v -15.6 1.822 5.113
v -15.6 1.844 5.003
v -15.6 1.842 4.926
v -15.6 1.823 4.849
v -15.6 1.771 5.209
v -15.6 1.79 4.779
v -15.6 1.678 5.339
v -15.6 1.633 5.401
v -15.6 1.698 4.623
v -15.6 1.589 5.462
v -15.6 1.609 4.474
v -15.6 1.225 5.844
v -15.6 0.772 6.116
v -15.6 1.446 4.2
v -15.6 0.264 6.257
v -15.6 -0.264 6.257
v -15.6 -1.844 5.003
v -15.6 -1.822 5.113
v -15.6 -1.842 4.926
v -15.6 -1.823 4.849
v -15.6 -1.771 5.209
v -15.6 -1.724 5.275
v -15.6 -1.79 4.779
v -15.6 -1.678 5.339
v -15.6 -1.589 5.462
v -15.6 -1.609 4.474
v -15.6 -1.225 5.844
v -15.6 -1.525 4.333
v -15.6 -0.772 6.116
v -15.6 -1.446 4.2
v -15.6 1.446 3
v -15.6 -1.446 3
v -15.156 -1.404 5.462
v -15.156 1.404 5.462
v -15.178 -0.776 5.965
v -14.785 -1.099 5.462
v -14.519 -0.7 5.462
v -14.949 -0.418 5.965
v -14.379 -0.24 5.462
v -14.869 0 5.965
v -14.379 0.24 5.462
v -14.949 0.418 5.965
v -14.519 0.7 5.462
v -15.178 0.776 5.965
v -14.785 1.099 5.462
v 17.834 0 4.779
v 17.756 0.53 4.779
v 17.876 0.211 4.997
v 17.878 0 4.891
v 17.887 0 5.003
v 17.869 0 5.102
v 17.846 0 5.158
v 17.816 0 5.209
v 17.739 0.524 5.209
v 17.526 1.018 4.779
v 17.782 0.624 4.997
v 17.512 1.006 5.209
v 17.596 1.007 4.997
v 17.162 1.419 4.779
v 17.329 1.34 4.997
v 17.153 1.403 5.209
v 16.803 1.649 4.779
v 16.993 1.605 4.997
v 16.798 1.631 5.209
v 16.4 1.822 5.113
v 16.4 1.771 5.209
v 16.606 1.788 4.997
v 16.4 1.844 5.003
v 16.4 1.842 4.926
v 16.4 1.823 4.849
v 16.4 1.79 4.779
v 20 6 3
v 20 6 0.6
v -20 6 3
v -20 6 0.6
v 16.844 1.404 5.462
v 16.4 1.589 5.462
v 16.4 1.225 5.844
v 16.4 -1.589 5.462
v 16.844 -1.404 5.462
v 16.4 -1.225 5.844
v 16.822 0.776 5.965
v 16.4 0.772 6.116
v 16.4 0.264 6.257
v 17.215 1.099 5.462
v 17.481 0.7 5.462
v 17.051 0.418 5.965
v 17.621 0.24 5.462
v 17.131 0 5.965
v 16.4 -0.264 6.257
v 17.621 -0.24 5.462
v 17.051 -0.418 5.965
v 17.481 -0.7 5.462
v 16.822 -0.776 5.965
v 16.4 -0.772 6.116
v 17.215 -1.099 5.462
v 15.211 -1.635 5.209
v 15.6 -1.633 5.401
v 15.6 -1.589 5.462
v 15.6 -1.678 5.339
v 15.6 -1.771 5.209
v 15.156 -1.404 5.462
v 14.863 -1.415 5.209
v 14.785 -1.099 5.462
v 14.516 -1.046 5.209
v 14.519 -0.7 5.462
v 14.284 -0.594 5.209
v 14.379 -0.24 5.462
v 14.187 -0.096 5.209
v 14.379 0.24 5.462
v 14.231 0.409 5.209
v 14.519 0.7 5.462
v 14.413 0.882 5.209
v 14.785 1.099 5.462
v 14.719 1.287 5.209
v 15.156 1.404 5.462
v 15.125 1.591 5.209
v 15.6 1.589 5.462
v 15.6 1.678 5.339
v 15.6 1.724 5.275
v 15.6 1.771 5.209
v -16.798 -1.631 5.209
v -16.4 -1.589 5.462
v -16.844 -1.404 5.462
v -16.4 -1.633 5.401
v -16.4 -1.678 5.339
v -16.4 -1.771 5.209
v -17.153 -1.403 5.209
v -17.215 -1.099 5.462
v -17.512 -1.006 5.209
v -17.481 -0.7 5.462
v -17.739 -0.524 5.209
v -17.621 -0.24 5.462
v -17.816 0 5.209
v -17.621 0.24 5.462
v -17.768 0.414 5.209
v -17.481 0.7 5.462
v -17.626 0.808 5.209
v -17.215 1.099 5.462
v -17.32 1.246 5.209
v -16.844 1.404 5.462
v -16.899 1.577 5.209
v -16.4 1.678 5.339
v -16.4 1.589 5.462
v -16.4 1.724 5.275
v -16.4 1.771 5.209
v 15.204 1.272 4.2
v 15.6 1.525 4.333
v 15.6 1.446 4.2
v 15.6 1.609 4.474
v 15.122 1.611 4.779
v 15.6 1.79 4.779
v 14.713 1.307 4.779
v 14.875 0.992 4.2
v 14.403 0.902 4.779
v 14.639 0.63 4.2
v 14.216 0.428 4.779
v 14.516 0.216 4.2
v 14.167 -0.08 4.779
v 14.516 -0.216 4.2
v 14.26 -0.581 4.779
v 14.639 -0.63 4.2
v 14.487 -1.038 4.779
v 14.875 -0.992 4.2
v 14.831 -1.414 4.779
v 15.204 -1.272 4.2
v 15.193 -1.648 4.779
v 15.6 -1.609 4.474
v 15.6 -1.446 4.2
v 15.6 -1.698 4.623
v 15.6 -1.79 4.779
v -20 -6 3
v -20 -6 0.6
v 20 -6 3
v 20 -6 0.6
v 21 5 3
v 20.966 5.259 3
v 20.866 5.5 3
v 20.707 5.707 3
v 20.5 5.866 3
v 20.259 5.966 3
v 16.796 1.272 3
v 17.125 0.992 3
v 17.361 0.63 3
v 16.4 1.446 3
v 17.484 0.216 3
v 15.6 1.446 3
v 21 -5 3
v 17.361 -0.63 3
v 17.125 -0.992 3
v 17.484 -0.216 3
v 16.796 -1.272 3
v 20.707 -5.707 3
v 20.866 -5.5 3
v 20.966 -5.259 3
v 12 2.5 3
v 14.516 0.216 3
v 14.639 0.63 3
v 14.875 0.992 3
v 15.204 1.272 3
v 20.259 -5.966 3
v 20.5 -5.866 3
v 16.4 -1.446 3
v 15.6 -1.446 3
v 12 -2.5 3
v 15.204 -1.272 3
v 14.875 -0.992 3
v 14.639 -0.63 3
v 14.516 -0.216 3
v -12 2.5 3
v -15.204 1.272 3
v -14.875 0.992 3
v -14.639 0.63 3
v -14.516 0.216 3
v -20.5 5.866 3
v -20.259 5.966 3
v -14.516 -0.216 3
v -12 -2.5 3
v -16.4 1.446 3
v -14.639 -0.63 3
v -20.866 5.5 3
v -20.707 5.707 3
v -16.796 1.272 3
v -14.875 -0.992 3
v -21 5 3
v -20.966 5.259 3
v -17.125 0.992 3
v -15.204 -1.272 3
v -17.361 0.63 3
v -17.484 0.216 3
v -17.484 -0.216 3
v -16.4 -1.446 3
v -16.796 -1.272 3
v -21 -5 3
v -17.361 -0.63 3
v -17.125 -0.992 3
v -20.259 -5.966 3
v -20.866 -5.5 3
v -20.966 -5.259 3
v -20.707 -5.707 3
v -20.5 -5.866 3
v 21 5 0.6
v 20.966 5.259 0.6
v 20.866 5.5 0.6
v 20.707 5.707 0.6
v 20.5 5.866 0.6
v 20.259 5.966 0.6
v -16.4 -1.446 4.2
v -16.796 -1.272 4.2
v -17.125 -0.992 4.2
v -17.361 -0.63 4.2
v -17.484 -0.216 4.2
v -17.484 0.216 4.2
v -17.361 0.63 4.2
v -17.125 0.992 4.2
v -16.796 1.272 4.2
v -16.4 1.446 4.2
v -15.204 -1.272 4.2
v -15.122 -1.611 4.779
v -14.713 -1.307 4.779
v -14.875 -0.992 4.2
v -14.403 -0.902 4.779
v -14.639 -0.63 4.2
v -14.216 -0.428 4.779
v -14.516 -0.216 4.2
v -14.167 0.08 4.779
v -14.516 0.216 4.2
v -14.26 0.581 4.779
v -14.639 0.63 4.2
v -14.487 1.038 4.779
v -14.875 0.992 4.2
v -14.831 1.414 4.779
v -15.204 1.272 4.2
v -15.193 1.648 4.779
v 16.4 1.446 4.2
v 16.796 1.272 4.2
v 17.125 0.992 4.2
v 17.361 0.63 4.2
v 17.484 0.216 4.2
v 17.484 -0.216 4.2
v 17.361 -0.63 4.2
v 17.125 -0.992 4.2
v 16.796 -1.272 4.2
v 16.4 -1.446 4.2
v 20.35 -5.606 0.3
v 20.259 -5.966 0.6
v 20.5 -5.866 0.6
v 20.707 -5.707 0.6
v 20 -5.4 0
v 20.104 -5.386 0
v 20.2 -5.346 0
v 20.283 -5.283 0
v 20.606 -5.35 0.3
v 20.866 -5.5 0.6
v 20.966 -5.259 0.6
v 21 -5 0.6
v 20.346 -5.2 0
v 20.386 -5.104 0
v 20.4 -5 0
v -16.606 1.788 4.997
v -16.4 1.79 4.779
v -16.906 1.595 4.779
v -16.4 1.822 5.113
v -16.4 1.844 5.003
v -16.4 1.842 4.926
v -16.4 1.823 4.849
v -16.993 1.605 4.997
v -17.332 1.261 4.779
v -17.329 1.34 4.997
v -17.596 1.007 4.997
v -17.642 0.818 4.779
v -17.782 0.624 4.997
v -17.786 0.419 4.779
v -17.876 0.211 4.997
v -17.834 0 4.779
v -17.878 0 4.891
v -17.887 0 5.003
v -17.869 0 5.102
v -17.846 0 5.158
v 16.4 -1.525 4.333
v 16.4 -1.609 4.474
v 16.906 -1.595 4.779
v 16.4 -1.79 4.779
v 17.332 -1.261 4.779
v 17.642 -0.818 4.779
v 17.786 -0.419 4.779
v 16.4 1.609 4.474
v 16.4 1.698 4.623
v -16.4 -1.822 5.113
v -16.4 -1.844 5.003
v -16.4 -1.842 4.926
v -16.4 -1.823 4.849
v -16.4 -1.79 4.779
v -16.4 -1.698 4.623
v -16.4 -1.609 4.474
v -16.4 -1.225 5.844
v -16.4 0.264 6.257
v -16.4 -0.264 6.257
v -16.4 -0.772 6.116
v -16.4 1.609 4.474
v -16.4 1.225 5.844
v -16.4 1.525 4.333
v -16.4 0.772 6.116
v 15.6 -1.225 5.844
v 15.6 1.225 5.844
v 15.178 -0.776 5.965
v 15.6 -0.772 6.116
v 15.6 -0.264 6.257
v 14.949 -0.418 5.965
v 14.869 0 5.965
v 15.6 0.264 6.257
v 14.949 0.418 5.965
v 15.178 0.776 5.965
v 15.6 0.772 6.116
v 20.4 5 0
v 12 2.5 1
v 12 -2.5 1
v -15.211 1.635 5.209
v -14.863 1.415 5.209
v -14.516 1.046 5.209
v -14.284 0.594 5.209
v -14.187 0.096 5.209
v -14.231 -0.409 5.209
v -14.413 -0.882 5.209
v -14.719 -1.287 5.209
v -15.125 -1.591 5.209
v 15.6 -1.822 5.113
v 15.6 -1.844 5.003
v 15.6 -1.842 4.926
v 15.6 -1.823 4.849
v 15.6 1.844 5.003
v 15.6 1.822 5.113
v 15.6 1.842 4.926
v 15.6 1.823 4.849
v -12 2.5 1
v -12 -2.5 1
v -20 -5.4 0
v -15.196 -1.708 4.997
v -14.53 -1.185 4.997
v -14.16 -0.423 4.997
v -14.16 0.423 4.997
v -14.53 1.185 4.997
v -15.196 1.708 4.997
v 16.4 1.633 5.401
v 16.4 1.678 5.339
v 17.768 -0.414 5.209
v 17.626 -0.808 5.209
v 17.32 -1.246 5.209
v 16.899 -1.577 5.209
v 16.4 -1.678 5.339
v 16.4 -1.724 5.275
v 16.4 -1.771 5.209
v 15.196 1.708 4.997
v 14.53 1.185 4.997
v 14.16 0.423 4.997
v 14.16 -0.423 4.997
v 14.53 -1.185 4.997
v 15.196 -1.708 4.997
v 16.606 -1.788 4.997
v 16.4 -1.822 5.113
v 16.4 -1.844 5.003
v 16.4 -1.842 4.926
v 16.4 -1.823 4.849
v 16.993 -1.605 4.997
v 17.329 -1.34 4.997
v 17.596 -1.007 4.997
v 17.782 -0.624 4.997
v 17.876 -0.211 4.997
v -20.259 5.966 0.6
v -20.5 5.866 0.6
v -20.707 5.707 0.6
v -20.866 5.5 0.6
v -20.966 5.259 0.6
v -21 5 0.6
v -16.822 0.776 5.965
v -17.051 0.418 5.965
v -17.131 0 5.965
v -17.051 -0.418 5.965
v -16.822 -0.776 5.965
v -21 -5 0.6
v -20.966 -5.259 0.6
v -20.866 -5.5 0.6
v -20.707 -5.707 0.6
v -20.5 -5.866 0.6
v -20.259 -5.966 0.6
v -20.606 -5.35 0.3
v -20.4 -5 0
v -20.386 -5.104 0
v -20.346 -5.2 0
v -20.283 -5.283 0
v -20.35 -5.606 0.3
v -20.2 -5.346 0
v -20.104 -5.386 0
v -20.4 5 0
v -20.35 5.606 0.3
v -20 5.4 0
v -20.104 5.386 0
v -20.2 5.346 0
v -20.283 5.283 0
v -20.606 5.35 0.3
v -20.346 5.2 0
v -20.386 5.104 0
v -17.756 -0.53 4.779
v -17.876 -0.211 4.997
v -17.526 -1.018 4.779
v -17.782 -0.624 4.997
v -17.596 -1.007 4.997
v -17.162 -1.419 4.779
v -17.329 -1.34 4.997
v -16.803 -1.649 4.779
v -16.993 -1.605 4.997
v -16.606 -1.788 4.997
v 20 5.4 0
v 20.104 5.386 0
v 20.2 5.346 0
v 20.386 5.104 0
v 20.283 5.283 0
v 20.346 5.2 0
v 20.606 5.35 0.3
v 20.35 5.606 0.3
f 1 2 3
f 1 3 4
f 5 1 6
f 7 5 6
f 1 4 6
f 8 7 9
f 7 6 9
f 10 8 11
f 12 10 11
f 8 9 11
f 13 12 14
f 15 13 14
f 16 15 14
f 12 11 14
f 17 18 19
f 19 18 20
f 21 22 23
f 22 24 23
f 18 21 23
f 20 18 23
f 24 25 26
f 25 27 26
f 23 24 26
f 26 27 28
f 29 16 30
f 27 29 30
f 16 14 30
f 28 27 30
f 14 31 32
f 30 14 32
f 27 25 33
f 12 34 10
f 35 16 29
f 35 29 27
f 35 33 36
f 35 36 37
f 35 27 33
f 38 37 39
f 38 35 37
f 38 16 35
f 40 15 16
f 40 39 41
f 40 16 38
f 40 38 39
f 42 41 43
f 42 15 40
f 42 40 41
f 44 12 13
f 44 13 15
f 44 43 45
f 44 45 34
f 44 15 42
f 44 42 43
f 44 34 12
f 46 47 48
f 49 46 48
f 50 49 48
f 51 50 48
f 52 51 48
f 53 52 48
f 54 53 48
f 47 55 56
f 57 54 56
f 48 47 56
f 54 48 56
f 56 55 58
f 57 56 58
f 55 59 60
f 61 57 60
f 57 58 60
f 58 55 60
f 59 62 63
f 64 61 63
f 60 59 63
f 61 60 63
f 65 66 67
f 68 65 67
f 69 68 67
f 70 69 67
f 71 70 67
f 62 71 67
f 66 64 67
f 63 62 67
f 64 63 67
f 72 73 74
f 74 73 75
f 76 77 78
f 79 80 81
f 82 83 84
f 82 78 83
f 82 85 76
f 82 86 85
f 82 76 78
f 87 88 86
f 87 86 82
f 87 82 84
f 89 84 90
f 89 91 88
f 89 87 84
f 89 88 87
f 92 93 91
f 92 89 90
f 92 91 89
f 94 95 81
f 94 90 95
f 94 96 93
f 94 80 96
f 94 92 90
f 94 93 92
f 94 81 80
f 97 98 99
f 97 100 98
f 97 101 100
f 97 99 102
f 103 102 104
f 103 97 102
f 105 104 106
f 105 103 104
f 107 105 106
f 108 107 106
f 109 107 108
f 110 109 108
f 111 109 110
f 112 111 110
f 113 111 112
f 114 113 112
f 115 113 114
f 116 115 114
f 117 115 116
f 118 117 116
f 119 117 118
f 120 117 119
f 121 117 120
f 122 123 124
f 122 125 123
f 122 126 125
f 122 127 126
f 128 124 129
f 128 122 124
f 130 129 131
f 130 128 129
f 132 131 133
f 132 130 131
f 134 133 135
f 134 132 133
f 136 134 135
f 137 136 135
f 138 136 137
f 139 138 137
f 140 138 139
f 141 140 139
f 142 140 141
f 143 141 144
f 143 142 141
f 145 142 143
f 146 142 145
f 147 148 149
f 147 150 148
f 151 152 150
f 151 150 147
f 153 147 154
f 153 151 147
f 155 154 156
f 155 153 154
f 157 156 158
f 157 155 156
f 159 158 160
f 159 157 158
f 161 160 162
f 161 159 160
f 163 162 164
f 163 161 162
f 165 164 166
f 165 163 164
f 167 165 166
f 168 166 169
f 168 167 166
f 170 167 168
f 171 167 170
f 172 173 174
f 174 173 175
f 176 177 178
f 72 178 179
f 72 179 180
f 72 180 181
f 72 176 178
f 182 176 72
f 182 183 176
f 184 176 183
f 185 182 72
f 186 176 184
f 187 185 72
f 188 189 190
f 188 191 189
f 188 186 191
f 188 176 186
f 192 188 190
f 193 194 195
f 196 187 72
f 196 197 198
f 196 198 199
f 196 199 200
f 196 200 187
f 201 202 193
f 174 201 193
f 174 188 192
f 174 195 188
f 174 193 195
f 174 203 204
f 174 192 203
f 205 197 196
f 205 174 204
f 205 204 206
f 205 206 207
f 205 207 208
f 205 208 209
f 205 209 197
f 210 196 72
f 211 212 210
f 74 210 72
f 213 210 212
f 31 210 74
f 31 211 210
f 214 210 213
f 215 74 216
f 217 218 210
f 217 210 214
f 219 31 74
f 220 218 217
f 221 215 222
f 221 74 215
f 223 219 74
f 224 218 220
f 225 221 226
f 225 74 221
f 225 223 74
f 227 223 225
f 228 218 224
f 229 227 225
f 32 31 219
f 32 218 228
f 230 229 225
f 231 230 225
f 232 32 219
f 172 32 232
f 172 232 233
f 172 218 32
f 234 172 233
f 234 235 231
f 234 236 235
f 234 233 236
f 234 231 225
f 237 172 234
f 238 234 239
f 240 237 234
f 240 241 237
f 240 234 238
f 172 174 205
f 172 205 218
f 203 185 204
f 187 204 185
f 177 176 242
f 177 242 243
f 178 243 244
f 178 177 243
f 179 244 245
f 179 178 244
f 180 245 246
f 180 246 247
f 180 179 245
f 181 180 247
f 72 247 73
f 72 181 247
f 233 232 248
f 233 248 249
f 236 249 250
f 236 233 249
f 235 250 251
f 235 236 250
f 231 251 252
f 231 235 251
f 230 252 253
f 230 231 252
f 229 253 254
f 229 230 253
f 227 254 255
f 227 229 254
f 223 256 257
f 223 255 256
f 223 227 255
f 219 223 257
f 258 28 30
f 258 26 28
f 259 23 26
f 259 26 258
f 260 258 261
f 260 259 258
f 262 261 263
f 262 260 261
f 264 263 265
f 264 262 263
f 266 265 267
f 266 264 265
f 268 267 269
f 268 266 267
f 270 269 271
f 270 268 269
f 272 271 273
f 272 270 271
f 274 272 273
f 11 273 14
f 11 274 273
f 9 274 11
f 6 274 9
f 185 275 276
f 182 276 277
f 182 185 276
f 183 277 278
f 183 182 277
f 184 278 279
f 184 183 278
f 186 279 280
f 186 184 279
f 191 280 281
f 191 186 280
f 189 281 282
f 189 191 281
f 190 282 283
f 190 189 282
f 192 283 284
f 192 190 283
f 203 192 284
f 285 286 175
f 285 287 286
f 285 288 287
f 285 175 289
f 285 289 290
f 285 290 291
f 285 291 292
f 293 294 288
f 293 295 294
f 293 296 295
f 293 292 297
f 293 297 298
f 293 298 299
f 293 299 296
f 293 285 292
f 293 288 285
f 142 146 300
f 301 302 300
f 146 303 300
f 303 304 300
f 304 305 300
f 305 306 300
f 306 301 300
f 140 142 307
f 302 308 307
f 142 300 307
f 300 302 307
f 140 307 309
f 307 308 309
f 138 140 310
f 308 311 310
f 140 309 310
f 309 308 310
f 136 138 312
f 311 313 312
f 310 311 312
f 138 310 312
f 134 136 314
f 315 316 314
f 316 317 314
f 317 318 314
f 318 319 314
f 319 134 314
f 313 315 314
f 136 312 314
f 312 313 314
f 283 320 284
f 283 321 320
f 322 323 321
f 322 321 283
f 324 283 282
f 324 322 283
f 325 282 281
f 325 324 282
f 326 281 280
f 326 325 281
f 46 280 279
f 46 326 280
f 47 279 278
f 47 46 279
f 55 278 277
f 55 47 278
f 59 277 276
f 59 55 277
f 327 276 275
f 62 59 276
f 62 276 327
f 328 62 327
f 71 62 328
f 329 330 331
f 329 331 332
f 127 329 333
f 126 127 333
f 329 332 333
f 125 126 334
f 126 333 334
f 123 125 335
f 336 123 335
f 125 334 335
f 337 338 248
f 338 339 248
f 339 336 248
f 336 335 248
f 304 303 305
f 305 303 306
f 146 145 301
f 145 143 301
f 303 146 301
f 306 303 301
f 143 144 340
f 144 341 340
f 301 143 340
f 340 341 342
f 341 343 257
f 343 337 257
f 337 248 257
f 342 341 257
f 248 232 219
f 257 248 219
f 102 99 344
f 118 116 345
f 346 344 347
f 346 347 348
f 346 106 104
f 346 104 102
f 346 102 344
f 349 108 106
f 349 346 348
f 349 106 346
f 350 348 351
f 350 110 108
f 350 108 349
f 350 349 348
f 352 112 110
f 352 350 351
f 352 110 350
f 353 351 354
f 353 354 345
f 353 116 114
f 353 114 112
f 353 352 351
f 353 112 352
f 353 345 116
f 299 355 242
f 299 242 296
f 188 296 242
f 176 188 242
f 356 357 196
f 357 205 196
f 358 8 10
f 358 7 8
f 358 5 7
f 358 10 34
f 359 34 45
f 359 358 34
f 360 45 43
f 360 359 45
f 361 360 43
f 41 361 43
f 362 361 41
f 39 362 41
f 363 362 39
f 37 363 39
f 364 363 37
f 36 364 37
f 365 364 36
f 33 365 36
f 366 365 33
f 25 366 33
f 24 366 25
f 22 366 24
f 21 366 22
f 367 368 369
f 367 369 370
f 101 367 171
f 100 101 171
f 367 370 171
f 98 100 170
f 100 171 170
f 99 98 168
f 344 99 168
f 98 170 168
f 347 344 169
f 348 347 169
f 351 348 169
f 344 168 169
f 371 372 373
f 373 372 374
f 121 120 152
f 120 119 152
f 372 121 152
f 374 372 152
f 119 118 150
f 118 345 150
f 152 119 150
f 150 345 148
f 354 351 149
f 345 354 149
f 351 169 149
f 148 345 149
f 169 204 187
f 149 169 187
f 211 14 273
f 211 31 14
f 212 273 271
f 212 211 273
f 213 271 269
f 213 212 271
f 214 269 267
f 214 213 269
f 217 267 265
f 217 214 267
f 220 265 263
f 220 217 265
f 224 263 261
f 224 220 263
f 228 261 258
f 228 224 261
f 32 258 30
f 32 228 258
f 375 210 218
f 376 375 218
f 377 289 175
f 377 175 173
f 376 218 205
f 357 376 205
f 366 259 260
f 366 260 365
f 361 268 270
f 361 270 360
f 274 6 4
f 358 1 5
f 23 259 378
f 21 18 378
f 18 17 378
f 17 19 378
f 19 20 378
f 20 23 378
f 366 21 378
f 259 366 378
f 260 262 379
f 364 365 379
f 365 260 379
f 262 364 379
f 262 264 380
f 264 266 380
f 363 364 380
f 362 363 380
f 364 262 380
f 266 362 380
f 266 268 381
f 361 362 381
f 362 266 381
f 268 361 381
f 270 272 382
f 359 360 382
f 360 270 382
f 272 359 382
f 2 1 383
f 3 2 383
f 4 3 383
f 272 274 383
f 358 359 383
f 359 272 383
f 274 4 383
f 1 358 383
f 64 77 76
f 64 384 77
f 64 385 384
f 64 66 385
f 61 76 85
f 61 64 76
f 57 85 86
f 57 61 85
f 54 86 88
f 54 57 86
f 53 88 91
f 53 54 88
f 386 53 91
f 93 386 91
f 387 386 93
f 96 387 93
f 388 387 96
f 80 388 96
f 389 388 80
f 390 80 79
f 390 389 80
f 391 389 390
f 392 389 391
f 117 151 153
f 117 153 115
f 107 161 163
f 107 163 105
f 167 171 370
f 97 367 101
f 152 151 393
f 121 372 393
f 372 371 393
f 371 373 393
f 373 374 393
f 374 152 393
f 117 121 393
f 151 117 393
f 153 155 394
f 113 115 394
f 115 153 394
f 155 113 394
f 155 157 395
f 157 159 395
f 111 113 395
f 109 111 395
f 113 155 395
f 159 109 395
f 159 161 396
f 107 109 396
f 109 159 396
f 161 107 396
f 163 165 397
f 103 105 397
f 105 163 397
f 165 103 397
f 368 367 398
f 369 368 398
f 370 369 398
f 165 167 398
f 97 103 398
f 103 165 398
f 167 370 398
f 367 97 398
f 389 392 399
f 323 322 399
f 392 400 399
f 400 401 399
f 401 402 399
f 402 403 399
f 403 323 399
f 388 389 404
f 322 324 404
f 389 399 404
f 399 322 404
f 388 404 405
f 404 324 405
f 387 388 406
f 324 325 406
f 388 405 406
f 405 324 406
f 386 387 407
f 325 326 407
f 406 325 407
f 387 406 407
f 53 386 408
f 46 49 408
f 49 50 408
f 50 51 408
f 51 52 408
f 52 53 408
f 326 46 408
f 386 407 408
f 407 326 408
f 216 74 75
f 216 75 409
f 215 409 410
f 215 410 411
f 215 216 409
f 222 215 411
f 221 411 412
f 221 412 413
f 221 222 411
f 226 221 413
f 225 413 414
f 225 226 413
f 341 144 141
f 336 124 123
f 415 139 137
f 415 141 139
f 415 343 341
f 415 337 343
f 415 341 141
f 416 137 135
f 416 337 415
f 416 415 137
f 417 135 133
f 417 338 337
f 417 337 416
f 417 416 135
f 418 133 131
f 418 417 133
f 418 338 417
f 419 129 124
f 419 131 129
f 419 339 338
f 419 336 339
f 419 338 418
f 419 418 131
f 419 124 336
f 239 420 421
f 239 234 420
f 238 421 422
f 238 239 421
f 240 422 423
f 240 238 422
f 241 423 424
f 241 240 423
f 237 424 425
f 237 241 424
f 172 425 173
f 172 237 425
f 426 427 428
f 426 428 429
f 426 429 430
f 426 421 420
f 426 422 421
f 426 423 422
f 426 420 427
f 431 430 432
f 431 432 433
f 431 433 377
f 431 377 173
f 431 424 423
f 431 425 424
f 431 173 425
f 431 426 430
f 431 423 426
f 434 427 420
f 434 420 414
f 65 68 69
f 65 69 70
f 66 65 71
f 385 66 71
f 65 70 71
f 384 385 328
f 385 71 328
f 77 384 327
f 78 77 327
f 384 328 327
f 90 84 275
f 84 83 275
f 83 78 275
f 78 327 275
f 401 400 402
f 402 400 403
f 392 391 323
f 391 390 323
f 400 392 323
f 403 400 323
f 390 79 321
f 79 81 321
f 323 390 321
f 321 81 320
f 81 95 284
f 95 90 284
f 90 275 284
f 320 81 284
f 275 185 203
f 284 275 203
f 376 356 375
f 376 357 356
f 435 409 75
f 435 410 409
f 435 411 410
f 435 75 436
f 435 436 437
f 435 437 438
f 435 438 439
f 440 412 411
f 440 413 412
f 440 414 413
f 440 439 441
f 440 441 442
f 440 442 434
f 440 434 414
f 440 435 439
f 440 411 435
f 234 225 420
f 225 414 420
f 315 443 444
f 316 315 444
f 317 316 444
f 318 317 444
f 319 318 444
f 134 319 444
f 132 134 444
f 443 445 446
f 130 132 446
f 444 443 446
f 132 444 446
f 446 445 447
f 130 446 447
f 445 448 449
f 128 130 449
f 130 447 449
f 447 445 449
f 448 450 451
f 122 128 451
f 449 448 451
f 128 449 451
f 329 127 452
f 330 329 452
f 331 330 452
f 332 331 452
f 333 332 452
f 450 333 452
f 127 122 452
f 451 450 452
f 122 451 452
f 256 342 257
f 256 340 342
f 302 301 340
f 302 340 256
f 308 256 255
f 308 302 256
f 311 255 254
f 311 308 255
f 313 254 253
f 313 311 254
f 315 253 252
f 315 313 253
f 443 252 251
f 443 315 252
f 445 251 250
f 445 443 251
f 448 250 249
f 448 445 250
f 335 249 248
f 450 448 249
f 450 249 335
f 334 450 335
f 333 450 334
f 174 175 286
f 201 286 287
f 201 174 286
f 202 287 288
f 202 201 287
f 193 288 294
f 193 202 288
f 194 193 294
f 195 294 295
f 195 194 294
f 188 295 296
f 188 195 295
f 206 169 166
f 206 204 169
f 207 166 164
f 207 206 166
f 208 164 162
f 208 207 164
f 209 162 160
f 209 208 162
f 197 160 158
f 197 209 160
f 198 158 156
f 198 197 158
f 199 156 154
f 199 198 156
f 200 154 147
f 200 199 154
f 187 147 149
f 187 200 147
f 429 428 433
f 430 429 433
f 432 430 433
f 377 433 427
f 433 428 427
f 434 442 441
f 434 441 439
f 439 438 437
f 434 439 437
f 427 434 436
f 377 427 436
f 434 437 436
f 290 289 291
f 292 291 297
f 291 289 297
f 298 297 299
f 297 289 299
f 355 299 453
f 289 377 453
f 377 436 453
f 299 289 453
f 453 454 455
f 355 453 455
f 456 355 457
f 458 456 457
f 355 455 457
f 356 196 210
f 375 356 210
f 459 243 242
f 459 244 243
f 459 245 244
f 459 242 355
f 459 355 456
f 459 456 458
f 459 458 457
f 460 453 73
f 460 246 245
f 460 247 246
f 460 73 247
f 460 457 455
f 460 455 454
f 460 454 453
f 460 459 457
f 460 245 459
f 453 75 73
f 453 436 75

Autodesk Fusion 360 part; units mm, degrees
sketch "Sketch1" plane through (0, 0, 0) normal (0, 0, 1) x (1, 0, 0)
  line L0 (21, 6) -> (-21, 6)
  line L1 (-21, 6) -> (-21, -6)
  line L2 (-21, -6) -> (21, -6)
  line L3 (21, -6) -> (21, 6)
  line L4 (21, 6) -> (-21, -6) construction
  line L5 (-21, 6) -> (21, -6) construction
  line L6 (-16, 0) -> (16, 0) construction
  circle A0 centre (-16, 0) radius 2.35
  circle A1 centre (16, 0) radius 2.35
  dimension "d1" = 12
  dimension "d2" = 42
  dimension "d3" = 32
  dimension "d4" = 4.7
extrude "Extrude1" add sketch "Sketch1" along normal blind 3 contours L0 L1 L2 L3 | A0 | A1
sketch "Sketch2" plane through (0, 0, 3) normal (0, 0, 1) x (-1, 0, 0)
  line L0 (-21, 6) -> (-21, -6)
  line L1 (-21, -6) -> (21, -6)
  line L2 (21, -6) -> (21, 6)
  line L3 (21, 6) -> (-21, 6)
  line L4 (16, 0) -> (-16, 0) construction
  circle A0 centre (16, 0) radius 1.5
  circle A1 centre (-16, 0) radius 1.5
  dimension "d7" = 32
  dimension "d11" = 3
extrude "Extrude2" add sketch "Sketch2" along normal blind 2 contours A0 | A1
sketch "Sketch3" plane through (0, 0, 3) normal (0, 0, 1) x (-1, 0, 0)
  line L0 (12, 2.5) -> (-12, 2.5)
  line L1 (-12, 2.5) -> (-12, -2.5)
  line L2 (-12, -2.5) -> (12, -2.5)
  line L3 (12, -2.5) -> (12, 2.5)
  line L4 (12, 2.5) -> (-12, -2.5) construction
  line L5 (-12, 2.5) -> (12, -2.5) construction
  dimension "d14" = 24
  dimension "d15" = 5
extrude "Extrude3" cut sketch "Sketch3" against normal blind 2
sketch "Sketch4" plane through (0, 0, 0) normal (0, 1, 0) x (1, 0, 0)
  line L0 (14.5, -5) -> (17.5, -5)
  line L1 (17.5, -3) -> (14.5, -3)
  line L2 (17.5, -3) -> (17.5, -5)
  line L3 (14.5, -3) -> (14.5, -5)
  line L4 (17.5, -4.2) -> (17.9619, -5)
  line L5 (17.9619, -5) -> (16, -7.8019)
  line L6 (16, -5) -> (16, -7.8019)
  line L7 (0, 0) -> (0, -0.3324)
  line L8 (0, -0.3324) -> (0, -9.743) construction
  line L9 (-17.9619, -5) -> (-16, -7.8019)
  line L10 (-17.5, -4.2) -> (-17.9619, -5)
  line L11 (-16, -5) -> (-16, -7.8019)
  line L12 (-17.5, -5) -> (-14.5, -5)
  line L13 (-14.5, -3) -> (-17.5, -3)
  line L14 (-17.5, -3) -> (-17.5, -5)
  line L15 (16, -7.8019) -> (14.0381, -5)
  arc A0 (14.3617, -5.4621) -> (17.6383, -5.4621) centre (16, -4.315) ccw
  arc A1 (-17.6383, -5.4621) -> (-14.3617, -5.4621) centre (-16, -4.315) ccw
  point P0 (16, -6.315)
  dimension "d19" = 1.2
  dimension "d22" = 30
  dimension "d23" = 2
  dimension "d27" = 2
  dimension "d29" = 70
revolve "Revolve1" add sketch "Sketch4" angle 360 about axis through (16, 0, 5) along (0, 0, 1) contours L0 L2 L4 L5 L6 A0
revolve "Revolve2" add sketch "Sketch4" angle 360 about axis through (-16, 0, 5) along (0, 0, 1) contours L9 L10 L11 L12 L14 A1
fillet "Fillet1" radius 0.4 2 edges at (14.1709, -0.7094, 5) (-17.8291, 0.7094, 5)
sketch "Sketch5" plane through (0, 0, 3) normal (0, 0, 1) x (-1, 0, 0)
  line L0 (-12, 2.5) -> (12, 2.5)
  line L1 (12, 2.5) -> (12, -2.5)
  line L2 (12, -2.5) -> (-12, -2.5)
  line L3 (-12, -2.5) -> (-12, 2.5)
  circle A0 centre (-16, 0) radius 1.5 construction
  circle A1 centre (16, 0) radius 1.5 construction
  line L4 (-21, 6) -> (-21, -6)
  line L5 (-21, -6) -> (21, -6)
  line L6 (21, -6) -> (21, 6)
  line L7 (21, 6) -> (-21, 6)
  circle A2 centre (16, 0) radius 1.8157 construction
  circle A3 centre (-16, 0) radius 1.8157 construction
  line L8 (15.6, 3.5) -> (16.4, 3.5)
  line L9 (16.4, 3.5) -> (16.4, -3.5)
  line L10 (16.4, -3.5) -> (15.6, -3.5)
  line L11 (15.6, -3.5) -> (15.6, 3.5)
  line L12 (15.6, 3.5) -> (16.4, -3.5) construction
  line L13 (16.4, 3.5) -> (15.6, -3.5) construction
  line L14 (-16.4, 3.5) -> (-15.6, 3.5)
  line L15 (-15.6, 3.5) -> (-15.6, -3.5)
  line L16 (-15.6, -3.5) -> (-16.4, -3.5)
  line L17 (-16.4, -3.5) -> (-16.4, 3.5)
  line L18 (-16.4, 3.5) -> (-15.6, -3.5) construction
  line L19 (-15.6, 3.5) -> (-16.4, -3.5) construction
  point P0 (16, 0)
  point P1 (-16, 0)
  dimension "d32" = 7
  dimension "d33" = 0.8
extrude "Extrude4" cut sketch "Sketch5" along normal blind 10 contours L8 L9 L10 L11 | L14 L15 L16 L17
fillet "Fillet2" radius 1 4 edges at (21, -6, 1.5) (-21, -6, 1.5) (-21, 6, 1.5) (21, 6, 1.5)
chamfer "Chamfer1" distance 0.6 angle 45 8 edges at (0, -6, 0) (20.7071, -5.7071, 0) (21, 0, 0) (20.7071, 5.7071, 0) (0, 6, 0) (-20.7071, 5.7071, 0) (-21, 0, 0) (-20.7071, -5.7071, 0)
